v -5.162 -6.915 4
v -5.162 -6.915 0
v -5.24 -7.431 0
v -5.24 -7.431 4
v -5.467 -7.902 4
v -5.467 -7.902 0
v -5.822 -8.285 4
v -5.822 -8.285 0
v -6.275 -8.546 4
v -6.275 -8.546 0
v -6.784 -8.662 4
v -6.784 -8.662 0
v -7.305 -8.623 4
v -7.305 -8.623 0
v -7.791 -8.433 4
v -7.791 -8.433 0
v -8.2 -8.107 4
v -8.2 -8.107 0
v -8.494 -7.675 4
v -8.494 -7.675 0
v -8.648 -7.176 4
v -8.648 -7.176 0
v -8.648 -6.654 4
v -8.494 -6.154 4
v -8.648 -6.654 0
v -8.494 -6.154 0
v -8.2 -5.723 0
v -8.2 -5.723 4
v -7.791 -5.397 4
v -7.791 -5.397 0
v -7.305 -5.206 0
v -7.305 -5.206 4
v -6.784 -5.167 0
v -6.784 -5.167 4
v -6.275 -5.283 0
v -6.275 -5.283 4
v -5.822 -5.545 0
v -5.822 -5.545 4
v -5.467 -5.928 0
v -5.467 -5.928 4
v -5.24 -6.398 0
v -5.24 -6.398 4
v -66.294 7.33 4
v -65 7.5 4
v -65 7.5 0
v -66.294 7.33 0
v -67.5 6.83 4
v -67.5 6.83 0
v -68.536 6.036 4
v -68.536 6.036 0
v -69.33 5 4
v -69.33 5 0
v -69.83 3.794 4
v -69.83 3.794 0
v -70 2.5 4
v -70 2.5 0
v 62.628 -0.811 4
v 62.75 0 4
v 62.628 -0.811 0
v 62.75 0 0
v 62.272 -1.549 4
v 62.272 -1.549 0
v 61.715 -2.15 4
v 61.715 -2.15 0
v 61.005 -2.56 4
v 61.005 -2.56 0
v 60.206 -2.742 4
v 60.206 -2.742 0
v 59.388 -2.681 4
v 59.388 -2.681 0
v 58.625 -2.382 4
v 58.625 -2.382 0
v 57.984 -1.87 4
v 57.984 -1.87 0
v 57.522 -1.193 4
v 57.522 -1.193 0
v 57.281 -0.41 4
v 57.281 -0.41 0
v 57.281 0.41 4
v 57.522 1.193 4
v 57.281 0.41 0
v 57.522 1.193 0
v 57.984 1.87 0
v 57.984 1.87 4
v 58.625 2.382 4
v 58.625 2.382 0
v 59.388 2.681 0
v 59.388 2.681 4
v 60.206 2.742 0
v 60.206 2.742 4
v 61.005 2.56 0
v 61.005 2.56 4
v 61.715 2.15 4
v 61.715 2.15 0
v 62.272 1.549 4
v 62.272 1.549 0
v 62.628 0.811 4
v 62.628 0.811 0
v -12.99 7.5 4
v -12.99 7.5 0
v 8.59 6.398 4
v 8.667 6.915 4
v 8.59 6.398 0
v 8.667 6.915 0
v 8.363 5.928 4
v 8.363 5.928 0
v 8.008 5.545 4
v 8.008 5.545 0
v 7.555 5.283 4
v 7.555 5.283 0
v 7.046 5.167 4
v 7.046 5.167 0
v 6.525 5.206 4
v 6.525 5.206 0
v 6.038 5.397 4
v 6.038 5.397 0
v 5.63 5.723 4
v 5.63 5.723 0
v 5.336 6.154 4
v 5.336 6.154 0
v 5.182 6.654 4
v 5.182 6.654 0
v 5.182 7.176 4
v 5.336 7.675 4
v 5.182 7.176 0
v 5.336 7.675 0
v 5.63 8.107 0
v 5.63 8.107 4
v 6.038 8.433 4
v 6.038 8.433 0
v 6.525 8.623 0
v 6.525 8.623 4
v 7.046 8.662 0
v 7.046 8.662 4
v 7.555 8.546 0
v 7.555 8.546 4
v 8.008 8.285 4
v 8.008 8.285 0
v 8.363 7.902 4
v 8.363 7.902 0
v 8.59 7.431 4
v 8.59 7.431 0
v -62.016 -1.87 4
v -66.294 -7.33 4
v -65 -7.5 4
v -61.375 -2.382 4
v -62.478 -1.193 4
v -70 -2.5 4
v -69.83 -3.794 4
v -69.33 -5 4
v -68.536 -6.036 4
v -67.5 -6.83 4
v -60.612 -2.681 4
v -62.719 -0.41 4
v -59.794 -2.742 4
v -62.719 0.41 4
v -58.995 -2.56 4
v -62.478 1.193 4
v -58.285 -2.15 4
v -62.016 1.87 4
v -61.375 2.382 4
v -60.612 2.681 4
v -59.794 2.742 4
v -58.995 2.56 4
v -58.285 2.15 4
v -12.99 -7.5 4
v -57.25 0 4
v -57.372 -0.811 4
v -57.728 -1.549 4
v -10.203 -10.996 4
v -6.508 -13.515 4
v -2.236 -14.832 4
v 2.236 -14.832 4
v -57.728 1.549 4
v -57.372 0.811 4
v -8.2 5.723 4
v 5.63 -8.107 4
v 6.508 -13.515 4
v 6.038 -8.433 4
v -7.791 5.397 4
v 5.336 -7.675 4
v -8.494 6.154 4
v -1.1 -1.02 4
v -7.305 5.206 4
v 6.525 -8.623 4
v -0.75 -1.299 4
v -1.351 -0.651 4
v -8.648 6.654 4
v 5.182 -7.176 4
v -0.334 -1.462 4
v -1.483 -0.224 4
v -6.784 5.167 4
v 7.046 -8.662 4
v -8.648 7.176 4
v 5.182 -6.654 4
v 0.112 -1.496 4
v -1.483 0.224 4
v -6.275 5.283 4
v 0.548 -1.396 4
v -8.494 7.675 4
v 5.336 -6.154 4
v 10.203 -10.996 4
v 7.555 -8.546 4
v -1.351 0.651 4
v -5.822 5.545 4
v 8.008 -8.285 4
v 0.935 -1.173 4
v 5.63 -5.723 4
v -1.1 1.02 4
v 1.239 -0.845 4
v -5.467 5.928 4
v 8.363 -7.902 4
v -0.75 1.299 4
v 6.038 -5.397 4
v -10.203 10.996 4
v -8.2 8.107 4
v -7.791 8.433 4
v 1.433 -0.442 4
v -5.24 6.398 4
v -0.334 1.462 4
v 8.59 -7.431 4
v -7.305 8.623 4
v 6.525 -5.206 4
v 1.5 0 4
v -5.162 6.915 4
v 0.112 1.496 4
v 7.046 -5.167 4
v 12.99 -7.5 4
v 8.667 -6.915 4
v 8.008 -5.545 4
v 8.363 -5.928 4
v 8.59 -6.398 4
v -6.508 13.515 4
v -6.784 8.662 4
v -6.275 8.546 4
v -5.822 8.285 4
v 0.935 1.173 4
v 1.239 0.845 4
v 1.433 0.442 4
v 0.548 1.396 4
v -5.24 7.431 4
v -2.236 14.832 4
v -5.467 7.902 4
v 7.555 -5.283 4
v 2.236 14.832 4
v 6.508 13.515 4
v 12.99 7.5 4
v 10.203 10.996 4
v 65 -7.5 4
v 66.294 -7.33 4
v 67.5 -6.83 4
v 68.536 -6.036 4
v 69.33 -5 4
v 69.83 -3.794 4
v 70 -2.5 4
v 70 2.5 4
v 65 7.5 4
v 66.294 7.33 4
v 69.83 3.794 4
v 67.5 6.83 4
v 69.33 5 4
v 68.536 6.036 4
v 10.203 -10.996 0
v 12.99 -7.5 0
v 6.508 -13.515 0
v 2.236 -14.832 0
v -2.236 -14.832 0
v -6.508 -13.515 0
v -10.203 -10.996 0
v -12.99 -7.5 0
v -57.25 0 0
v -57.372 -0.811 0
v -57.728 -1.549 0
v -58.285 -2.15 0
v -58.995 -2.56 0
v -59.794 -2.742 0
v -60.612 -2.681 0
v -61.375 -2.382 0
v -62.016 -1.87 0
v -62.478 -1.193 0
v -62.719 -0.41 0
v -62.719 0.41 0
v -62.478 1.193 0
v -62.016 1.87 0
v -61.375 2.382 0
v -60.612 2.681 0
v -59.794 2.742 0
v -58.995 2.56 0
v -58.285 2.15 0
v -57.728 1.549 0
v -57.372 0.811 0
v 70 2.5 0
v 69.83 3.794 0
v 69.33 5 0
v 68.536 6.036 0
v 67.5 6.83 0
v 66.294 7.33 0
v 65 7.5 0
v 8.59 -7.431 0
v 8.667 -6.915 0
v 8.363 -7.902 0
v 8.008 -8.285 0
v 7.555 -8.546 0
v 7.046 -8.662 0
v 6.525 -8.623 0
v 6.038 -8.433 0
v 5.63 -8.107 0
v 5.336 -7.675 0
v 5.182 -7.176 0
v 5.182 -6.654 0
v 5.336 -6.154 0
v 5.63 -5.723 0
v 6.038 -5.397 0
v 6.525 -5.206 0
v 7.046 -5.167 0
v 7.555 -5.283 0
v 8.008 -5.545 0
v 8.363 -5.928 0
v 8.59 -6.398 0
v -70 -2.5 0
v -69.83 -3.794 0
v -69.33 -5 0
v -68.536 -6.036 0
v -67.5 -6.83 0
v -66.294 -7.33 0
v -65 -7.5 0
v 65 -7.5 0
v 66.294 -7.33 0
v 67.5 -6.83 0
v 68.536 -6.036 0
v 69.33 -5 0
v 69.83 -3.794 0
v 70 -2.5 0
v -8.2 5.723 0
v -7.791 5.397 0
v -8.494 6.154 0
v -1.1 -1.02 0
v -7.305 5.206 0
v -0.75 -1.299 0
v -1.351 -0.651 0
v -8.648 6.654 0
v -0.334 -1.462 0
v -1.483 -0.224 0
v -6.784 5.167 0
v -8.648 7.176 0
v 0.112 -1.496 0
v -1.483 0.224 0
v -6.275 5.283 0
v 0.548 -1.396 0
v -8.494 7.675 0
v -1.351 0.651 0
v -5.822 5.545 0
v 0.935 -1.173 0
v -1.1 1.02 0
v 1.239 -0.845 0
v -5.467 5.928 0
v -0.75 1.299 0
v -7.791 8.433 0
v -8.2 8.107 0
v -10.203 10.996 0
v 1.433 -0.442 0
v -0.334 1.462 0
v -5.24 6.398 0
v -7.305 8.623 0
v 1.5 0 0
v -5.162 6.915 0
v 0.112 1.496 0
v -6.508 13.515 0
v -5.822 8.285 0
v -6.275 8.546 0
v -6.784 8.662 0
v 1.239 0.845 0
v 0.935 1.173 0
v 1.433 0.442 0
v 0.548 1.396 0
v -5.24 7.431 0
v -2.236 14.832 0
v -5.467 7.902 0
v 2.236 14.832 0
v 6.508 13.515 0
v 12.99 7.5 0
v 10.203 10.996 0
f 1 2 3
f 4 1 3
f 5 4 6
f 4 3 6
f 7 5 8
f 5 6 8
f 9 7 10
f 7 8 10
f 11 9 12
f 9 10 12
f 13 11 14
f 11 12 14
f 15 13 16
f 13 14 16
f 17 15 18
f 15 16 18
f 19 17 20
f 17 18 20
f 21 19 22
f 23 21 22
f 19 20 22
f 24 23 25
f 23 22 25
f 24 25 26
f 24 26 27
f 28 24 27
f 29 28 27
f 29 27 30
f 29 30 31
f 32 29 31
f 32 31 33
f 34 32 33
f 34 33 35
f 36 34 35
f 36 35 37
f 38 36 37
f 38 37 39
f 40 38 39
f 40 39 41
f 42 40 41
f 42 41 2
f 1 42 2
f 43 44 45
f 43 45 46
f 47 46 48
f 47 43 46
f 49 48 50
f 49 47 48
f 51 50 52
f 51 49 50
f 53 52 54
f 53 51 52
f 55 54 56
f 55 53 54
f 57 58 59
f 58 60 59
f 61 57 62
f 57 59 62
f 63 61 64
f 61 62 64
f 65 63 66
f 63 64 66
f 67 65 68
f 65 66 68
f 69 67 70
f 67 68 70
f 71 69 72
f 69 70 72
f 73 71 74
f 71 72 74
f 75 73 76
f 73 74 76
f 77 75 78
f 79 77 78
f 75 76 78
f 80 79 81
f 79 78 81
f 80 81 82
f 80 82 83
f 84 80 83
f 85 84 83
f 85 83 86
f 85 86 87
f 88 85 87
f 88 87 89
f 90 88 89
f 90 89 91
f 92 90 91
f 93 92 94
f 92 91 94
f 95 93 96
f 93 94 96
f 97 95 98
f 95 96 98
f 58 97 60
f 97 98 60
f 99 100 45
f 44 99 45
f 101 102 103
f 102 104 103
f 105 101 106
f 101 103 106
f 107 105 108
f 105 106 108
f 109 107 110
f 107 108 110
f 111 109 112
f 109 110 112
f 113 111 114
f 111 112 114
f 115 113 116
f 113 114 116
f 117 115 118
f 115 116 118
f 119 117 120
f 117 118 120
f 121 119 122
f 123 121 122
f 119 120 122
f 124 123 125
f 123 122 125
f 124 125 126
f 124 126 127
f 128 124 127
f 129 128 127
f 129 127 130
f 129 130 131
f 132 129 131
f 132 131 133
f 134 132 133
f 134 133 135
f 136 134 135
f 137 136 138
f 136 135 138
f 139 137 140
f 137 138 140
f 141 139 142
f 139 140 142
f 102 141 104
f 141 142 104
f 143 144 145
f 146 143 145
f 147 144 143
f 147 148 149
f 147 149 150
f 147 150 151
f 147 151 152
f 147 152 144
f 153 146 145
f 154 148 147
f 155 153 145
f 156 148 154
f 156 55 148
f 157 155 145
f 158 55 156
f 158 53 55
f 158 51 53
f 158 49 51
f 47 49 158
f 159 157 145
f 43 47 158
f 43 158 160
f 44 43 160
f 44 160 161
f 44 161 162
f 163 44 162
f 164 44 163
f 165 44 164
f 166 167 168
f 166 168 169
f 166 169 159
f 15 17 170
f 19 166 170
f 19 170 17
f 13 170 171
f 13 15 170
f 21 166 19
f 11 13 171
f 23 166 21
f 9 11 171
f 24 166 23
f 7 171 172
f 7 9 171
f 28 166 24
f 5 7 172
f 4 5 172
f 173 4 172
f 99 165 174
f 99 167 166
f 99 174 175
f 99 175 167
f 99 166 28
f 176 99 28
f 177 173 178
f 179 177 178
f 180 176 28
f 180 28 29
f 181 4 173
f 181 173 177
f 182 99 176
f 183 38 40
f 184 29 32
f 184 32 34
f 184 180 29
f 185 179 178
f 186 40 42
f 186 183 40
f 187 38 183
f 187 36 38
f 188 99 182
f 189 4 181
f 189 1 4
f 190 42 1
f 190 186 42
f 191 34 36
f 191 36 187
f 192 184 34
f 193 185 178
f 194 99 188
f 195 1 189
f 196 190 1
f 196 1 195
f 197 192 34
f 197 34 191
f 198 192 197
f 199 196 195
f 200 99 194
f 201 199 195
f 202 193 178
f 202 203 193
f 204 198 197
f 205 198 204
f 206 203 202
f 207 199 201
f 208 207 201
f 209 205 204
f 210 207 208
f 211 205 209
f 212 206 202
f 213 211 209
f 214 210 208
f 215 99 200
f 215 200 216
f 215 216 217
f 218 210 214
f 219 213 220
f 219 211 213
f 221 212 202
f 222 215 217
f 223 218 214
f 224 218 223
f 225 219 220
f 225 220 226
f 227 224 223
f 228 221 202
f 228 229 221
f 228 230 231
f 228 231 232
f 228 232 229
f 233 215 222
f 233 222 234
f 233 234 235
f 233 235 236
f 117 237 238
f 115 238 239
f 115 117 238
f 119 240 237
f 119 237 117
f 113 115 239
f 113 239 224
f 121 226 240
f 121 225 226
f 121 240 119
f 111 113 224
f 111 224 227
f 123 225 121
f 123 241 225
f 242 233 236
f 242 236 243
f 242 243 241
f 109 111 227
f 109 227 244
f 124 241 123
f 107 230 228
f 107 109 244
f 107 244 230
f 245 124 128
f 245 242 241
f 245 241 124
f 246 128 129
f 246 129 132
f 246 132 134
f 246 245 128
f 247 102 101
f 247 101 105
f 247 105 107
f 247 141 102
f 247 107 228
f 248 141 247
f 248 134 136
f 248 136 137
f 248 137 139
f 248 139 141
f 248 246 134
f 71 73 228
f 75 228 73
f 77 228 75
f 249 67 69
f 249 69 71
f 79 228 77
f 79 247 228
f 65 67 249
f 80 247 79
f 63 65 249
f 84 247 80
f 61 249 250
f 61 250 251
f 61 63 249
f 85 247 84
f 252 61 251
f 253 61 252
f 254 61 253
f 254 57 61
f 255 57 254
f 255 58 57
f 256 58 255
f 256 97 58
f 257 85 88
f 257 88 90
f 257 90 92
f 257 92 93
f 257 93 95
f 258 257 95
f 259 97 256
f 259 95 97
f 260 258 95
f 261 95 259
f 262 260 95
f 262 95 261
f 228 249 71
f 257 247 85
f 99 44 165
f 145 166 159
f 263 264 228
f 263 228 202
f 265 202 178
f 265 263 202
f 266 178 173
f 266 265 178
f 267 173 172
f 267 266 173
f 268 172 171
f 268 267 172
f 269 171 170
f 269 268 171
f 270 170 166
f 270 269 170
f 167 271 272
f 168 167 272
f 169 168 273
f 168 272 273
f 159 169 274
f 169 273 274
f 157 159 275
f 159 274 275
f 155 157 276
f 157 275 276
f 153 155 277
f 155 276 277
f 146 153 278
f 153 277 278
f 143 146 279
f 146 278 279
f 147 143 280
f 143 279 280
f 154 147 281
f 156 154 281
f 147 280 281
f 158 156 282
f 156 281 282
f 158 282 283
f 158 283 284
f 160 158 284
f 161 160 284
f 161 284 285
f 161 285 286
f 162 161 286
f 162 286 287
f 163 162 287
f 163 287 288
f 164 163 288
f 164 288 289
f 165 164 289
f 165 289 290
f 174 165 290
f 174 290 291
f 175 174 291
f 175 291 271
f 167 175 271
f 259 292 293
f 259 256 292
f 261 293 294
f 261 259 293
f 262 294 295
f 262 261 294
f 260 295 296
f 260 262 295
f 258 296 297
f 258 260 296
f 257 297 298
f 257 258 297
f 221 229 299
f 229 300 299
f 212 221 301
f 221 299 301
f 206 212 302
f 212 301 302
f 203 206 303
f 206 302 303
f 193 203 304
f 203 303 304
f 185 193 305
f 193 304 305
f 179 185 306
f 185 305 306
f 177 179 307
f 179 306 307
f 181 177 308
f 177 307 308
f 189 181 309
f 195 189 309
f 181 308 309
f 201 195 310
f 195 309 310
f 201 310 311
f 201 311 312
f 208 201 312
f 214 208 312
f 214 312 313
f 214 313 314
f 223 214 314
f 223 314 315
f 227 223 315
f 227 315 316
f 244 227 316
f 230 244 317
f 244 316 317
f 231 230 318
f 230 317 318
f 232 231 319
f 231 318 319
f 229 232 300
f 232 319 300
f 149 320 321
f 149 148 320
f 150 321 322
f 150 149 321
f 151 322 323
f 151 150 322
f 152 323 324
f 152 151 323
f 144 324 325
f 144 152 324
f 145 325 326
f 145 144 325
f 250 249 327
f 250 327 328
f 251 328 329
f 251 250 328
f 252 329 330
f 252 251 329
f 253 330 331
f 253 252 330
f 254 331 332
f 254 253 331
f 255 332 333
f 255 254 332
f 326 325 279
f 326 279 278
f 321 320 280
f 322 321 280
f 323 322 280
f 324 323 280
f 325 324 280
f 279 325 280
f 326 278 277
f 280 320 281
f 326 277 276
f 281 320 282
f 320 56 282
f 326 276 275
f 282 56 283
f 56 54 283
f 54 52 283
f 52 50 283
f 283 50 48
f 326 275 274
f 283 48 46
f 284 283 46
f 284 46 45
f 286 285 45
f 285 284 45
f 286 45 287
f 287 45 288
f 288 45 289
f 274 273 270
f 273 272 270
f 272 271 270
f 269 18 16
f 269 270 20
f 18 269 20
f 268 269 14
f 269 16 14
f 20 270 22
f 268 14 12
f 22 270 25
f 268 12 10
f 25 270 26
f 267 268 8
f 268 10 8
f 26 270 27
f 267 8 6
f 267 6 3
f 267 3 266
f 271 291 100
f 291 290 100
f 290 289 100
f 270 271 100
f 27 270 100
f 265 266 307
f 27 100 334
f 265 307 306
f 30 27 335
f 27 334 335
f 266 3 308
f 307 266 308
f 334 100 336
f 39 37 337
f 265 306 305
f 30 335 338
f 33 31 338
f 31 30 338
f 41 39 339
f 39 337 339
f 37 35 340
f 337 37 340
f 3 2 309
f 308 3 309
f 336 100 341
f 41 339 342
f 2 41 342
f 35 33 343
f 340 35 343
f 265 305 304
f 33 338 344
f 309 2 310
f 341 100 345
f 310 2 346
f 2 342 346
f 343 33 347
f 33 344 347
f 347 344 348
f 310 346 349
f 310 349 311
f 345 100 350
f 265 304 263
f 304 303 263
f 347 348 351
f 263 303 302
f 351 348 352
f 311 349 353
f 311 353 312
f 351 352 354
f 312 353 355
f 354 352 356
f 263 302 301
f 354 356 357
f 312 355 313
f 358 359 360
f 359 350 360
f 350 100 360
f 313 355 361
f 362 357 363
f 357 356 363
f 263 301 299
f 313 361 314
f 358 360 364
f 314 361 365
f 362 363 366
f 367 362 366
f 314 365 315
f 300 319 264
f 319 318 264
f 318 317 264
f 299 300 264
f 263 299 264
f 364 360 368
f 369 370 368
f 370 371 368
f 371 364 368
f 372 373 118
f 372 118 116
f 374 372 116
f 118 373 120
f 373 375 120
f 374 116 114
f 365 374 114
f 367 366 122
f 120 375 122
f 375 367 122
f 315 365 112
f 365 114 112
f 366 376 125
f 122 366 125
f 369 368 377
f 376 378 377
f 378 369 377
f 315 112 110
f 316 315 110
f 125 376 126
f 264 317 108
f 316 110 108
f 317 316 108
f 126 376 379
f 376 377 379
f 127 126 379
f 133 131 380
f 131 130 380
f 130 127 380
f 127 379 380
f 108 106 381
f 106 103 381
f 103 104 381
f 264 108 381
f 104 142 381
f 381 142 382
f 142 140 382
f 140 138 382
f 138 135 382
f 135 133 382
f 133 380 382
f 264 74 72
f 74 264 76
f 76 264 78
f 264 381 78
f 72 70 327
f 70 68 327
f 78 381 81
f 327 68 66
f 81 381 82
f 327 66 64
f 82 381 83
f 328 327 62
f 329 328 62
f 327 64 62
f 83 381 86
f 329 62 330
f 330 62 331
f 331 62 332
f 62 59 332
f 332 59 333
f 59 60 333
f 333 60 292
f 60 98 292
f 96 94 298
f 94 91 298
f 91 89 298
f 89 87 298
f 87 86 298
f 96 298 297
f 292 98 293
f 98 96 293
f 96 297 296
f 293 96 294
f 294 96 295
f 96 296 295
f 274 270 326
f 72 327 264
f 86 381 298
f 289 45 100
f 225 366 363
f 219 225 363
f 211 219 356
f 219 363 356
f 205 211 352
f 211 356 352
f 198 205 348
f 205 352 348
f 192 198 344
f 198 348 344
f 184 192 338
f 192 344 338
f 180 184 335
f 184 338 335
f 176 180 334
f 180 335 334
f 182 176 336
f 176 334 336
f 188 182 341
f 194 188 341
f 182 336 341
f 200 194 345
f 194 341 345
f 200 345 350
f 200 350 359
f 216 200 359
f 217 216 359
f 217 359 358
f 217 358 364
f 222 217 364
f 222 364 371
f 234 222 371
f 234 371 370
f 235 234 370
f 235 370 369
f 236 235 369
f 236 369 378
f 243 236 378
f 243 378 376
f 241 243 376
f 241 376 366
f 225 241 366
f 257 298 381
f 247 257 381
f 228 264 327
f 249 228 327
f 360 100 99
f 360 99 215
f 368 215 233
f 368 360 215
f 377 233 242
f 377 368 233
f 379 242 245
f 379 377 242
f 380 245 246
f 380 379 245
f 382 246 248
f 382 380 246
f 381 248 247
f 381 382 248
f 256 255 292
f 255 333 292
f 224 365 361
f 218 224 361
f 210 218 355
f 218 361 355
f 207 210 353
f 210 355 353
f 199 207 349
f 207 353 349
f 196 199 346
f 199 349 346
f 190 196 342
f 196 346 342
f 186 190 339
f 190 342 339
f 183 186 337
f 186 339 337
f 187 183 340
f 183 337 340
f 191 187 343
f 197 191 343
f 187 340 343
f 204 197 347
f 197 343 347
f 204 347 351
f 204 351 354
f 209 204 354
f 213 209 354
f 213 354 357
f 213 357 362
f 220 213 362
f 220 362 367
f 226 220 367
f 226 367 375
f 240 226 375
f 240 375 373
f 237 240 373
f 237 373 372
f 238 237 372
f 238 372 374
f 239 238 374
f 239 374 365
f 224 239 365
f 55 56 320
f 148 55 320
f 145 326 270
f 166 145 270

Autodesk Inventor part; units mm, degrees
ref_plane "YZ Plane" through (0, 0, 0) normal (1, 0, 0) x (0, 1, 0)
ref_plane "XZ Plane" through (0, 0, 0) normal (0, 1, 0) x (-1, 0, 0)
ref_plane "XY Plane" through (0, 0, 0) normal (0, 0, 1) x (1, 0, 0)
sketch "Sketch1" plane through (0, 0, 0) normal (0, 0, 1) x (1, 0, 0)
  line L0 (-70, -7.5) -> (70, -7.5)
  line L1 (70, -7.5) -> (70, 7.5)
  line L2 (70, 7.5) -> (-70, 7.5)
  line L3 (-70, 7.5) -> (-70, -7.5)
  line L4 (-70, -7.5) -> (70, 7.5) construction
  line L5 (70, -7.5) -> (-70, 7.5) construction
  circle A0 centre (0, 0) radius 15
  line L6 (-73.4722, 0) -> (96.5278, 0) construction
  circle A1 centre (-60, 0) radius 2.75
  line L7 (0, 0) -> (0, 31) construction
  circle A2 centre (60, 0) radius 2.75
  circle A3 centre (0, 0) radius 1.5
  circle A4 centre (-6.9148, 6.9148) radius 1.7526
  line L8 (0, 0) -> (-14.5685, 14.5685) construction
  circle A5 centre (-6.9148, -6.9148) radius 1.7526
  circle A6 centre (6.9148, -6.9148) radius 1.7526
  circle A7 centre (6.9148, 6.9148) radius 1.7526
  point P0 (0, 0)
  dimension "d0" = 140
  dimension "d1" = 15
  dimension "d4" = 30
  dimension "d5" = 5.5
  dimension "d6" = 10
  dimension "d10" = 3
  dimension "d11" = 3.5052
  dimension "d12" = 45
  dimension "d13" = 6.9148
  dimension "d16" = 360
extrude "Extrusion1" add sketch "Sketch1" along normal blind 4 contours L3 L2 A0 L0 | A0 L2 A4 A7 L0 A6 A5 | L0 A5 A6 A0 | A5 L0 | L0 A5 | A0 L2 A7 A4 | A0 L2 L1 L0 | A4 L2 | L2 A4 | A6 L0 | L0 A6 | A7 L2 | L2 A7 | A1 | A2 | A3
extrude "Extrusion2" cut sketch "Sketch1" along normal through all contours A5 L0 | L0 A5 | A4 L2 | L2 A4 | A6 L0 | L0 A6 | A7 L2 | L2 A7 | A1 | A2 | A3
fillet "Fillet1" radius 5 4 edges at (70, -7.5, 2) (70, 7.5, 2) (-70, -7.5, 2) (-70, 7.5, 2)
equation "\"BendRadius\" = Thickness"
equation "\"BendReliefWidth\" = Thickness"
equation "\"BendReliefDepth\" = 0.5 * Thickness"
equation "\"CornerReliefSize\" = 4 * Thickness"
equation "\"MinimumRemnant\" = 2 * Thickness"
equation "\"TransitionRadius\" = BendRadius"
equation "\"JacobiRadiusSize\" = Thickness"
equation "\"GapSize\" = Thickness"
equation "\"Thickness\" = 0.5"
properties part number "rudder_horn"
